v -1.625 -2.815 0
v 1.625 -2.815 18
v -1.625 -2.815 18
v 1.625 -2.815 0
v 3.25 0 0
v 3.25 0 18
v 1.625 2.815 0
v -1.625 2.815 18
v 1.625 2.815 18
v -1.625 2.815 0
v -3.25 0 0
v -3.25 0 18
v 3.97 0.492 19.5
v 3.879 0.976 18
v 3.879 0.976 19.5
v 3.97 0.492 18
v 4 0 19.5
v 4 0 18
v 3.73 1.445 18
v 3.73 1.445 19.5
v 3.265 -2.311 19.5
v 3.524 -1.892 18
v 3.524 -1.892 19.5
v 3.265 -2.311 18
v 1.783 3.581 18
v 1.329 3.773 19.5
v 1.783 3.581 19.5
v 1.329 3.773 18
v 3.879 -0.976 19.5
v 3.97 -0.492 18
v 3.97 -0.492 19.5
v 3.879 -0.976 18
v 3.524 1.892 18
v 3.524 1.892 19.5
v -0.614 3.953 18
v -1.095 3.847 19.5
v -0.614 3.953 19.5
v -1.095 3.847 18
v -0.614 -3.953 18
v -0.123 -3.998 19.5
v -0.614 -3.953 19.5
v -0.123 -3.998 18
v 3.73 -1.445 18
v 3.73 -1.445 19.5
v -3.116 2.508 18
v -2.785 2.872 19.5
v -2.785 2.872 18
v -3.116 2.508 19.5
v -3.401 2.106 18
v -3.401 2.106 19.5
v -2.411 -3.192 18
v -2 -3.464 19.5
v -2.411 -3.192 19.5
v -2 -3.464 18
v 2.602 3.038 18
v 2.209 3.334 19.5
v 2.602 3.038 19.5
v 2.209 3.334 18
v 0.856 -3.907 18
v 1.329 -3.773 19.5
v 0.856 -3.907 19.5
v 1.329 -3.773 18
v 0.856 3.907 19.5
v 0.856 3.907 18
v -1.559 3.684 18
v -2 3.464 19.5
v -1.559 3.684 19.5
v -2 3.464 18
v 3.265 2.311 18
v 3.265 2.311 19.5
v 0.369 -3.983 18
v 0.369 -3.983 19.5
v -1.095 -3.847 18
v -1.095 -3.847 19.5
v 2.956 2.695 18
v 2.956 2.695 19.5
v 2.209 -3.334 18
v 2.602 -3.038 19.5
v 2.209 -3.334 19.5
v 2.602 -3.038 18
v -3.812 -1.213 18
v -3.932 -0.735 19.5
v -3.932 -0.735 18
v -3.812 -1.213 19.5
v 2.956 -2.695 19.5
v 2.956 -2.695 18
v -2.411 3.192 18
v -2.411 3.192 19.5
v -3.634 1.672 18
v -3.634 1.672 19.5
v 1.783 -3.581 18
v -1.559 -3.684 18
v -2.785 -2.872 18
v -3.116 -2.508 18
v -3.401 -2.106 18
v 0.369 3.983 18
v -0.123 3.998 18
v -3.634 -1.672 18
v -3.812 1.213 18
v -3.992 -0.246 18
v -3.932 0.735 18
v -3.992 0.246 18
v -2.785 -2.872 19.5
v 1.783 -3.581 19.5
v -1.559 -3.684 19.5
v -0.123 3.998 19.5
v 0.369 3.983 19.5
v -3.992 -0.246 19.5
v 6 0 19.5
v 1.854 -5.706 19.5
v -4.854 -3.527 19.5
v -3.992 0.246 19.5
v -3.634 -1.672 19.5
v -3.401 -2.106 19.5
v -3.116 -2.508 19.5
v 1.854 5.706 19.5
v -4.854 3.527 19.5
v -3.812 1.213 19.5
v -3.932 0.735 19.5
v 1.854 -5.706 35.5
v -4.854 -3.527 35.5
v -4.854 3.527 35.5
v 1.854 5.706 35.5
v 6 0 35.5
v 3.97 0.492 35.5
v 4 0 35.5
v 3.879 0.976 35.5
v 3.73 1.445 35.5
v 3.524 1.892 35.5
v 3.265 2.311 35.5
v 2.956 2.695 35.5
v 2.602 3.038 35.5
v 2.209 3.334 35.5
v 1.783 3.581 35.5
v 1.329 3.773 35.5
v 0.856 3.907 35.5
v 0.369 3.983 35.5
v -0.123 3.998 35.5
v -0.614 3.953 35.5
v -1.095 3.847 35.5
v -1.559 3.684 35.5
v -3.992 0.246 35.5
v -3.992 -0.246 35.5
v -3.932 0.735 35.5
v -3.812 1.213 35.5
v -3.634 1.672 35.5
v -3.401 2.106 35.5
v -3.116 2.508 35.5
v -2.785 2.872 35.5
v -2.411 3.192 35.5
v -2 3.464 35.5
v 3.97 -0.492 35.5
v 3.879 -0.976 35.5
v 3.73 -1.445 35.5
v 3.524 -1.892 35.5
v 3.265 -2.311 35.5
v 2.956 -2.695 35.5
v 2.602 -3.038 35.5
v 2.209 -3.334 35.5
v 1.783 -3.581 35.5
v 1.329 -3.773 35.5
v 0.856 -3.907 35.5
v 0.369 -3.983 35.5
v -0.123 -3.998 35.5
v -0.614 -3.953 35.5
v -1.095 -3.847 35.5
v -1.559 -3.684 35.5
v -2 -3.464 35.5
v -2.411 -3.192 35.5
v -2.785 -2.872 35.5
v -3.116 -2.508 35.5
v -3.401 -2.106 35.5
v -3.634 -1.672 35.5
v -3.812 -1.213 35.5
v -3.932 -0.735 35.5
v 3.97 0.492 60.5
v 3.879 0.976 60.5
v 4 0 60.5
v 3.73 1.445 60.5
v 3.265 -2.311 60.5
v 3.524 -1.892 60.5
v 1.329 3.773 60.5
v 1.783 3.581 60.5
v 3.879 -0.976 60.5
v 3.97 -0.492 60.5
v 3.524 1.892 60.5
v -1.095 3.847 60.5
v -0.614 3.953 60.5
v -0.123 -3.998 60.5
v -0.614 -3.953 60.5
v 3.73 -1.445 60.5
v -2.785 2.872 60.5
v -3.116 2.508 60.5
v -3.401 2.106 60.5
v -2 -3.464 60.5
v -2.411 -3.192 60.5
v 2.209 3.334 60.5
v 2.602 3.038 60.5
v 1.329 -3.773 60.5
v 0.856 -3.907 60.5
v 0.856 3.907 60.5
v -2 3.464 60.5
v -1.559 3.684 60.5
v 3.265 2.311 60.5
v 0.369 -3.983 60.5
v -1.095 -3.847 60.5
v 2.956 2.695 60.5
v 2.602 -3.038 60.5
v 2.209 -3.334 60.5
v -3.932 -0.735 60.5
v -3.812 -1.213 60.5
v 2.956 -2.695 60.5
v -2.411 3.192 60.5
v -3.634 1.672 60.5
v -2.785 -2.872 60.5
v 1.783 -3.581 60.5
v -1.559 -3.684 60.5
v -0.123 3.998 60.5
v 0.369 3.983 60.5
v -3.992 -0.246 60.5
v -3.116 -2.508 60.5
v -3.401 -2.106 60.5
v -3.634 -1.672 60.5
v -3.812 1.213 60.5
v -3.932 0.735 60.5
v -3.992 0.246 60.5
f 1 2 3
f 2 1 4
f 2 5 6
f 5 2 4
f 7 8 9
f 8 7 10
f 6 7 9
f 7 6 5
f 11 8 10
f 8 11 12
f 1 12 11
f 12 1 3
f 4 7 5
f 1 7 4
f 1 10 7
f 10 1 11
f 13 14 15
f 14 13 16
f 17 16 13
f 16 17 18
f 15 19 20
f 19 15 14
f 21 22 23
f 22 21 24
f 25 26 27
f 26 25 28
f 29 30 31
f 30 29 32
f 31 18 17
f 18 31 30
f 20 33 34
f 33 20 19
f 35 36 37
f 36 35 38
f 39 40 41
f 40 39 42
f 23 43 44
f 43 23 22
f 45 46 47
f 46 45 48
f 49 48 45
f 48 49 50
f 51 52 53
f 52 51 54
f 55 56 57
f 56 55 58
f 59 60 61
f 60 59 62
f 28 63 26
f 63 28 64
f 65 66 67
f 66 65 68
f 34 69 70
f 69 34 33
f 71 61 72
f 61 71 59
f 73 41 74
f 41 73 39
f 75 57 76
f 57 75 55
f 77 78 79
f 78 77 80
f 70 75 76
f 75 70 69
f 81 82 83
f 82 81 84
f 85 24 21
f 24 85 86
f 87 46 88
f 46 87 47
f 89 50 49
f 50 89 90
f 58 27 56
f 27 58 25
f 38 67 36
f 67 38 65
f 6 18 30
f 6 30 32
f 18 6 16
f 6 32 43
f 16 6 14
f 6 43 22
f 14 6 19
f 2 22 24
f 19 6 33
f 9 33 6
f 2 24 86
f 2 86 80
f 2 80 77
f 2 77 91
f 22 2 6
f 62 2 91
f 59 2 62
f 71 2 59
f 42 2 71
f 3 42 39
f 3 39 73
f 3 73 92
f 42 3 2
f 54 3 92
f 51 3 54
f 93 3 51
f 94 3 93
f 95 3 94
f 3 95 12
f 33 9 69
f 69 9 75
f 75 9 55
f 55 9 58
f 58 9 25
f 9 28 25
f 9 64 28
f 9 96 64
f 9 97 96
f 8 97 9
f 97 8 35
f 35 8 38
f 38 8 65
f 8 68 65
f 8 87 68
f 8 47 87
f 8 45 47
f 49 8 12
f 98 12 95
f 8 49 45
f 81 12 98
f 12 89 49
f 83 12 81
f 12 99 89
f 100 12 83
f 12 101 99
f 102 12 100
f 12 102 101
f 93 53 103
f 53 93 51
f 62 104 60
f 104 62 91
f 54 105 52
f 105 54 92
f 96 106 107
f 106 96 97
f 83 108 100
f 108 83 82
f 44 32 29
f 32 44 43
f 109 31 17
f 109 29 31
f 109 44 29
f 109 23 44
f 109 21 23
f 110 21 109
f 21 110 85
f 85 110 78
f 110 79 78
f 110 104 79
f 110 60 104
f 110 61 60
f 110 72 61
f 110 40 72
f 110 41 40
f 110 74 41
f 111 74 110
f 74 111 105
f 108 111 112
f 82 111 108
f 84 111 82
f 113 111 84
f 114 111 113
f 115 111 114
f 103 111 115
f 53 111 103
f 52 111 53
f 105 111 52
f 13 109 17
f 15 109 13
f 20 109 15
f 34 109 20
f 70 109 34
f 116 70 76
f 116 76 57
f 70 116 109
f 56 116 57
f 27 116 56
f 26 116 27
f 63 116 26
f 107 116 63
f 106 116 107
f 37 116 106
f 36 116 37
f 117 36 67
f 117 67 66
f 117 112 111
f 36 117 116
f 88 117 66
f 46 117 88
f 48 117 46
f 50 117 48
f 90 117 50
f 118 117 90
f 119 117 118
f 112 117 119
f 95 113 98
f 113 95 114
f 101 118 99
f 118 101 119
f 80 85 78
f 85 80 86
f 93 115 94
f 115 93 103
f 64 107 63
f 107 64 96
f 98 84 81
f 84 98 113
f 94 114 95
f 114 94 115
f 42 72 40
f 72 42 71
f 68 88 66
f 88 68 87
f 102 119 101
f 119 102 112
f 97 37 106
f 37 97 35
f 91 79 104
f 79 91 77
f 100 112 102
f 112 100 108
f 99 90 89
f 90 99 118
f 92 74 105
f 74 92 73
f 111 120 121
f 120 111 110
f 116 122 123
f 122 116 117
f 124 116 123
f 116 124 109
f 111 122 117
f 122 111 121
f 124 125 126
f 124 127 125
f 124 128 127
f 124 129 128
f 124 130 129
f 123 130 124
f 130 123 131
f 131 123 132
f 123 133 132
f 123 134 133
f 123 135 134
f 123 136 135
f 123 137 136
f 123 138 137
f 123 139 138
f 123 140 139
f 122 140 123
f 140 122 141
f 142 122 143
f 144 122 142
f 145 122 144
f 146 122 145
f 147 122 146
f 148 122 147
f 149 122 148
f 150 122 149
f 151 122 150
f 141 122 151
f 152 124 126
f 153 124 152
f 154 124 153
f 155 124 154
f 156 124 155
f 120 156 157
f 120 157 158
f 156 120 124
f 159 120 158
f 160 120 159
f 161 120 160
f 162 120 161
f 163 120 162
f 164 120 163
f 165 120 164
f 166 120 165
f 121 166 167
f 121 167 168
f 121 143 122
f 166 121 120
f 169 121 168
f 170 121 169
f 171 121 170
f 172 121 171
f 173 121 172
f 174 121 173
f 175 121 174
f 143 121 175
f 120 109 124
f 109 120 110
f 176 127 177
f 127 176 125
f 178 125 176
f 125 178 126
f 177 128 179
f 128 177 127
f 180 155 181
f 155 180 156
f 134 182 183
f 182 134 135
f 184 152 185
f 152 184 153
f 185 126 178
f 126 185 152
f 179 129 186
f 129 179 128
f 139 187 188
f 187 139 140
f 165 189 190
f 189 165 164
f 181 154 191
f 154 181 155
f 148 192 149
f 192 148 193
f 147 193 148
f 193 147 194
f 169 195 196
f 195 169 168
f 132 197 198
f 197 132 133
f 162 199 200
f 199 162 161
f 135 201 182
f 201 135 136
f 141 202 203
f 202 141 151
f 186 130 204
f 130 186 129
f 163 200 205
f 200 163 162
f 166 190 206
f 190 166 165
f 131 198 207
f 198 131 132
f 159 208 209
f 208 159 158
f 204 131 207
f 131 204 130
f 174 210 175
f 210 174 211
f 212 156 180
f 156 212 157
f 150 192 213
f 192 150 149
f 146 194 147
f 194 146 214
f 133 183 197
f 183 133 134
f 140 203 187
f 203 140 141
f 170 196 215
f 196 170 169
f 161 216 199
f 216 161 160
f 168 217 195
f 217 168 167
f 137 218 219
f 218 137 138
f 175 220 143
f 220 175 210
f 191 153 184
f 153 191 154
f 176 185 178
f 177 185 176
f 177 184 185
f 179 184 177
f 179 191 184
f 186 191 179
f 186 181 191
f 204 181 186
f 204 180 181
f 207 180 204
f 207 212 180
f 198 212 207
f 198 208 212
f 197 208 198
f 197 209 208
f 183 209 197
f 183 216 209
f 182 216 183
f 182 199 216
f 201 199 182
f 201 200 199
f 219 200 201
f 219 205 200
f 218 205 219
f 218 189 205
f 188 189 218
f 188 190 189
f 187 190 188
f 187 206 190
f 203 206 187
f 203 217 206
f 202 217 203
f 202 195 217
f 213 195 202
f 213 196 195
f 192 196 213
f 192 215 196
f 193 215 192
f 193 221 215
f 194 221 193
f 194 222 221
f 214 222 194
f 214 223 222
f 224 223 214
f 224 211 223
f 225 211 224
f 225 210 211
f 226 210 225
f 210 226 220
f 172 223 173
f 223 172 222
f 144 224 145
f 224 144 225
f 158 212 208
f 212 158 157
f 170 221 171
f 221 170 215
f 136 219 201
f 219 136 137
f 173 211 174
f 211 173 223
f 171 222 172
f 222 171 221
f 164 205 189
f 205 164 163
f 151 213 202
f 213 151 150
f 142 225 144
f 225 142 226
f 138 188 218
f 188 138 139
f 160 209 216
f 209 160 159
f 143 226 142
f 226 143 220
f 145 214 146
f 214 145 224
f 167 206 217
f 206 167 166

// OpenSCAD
$fa = 0.5;
$fs = 0.5;

// Sechskant
d_hex = 6.5;
d_welle = 8;
laenge_hex = 19; // +1
laenge_pent = 16;
laenge_welle = 25;
// d_aussen = 11;
d_pent = 12;
// l_pent = 10;
// wall=3;


union(){
  translate([0,0,0]) cylinder(h=laenge_hex, d=d_hex, $fn=6);
  translate([0,0,18]) cylinder(h=1.5, d=d_welle);
  translate([0,0,19.5]) cylinder(h=laenge_pent, d=d_pent, $fn=5);
  translate([0,0,35.5]) cylinder(h=laenge_welle, d=d_welle);
}
